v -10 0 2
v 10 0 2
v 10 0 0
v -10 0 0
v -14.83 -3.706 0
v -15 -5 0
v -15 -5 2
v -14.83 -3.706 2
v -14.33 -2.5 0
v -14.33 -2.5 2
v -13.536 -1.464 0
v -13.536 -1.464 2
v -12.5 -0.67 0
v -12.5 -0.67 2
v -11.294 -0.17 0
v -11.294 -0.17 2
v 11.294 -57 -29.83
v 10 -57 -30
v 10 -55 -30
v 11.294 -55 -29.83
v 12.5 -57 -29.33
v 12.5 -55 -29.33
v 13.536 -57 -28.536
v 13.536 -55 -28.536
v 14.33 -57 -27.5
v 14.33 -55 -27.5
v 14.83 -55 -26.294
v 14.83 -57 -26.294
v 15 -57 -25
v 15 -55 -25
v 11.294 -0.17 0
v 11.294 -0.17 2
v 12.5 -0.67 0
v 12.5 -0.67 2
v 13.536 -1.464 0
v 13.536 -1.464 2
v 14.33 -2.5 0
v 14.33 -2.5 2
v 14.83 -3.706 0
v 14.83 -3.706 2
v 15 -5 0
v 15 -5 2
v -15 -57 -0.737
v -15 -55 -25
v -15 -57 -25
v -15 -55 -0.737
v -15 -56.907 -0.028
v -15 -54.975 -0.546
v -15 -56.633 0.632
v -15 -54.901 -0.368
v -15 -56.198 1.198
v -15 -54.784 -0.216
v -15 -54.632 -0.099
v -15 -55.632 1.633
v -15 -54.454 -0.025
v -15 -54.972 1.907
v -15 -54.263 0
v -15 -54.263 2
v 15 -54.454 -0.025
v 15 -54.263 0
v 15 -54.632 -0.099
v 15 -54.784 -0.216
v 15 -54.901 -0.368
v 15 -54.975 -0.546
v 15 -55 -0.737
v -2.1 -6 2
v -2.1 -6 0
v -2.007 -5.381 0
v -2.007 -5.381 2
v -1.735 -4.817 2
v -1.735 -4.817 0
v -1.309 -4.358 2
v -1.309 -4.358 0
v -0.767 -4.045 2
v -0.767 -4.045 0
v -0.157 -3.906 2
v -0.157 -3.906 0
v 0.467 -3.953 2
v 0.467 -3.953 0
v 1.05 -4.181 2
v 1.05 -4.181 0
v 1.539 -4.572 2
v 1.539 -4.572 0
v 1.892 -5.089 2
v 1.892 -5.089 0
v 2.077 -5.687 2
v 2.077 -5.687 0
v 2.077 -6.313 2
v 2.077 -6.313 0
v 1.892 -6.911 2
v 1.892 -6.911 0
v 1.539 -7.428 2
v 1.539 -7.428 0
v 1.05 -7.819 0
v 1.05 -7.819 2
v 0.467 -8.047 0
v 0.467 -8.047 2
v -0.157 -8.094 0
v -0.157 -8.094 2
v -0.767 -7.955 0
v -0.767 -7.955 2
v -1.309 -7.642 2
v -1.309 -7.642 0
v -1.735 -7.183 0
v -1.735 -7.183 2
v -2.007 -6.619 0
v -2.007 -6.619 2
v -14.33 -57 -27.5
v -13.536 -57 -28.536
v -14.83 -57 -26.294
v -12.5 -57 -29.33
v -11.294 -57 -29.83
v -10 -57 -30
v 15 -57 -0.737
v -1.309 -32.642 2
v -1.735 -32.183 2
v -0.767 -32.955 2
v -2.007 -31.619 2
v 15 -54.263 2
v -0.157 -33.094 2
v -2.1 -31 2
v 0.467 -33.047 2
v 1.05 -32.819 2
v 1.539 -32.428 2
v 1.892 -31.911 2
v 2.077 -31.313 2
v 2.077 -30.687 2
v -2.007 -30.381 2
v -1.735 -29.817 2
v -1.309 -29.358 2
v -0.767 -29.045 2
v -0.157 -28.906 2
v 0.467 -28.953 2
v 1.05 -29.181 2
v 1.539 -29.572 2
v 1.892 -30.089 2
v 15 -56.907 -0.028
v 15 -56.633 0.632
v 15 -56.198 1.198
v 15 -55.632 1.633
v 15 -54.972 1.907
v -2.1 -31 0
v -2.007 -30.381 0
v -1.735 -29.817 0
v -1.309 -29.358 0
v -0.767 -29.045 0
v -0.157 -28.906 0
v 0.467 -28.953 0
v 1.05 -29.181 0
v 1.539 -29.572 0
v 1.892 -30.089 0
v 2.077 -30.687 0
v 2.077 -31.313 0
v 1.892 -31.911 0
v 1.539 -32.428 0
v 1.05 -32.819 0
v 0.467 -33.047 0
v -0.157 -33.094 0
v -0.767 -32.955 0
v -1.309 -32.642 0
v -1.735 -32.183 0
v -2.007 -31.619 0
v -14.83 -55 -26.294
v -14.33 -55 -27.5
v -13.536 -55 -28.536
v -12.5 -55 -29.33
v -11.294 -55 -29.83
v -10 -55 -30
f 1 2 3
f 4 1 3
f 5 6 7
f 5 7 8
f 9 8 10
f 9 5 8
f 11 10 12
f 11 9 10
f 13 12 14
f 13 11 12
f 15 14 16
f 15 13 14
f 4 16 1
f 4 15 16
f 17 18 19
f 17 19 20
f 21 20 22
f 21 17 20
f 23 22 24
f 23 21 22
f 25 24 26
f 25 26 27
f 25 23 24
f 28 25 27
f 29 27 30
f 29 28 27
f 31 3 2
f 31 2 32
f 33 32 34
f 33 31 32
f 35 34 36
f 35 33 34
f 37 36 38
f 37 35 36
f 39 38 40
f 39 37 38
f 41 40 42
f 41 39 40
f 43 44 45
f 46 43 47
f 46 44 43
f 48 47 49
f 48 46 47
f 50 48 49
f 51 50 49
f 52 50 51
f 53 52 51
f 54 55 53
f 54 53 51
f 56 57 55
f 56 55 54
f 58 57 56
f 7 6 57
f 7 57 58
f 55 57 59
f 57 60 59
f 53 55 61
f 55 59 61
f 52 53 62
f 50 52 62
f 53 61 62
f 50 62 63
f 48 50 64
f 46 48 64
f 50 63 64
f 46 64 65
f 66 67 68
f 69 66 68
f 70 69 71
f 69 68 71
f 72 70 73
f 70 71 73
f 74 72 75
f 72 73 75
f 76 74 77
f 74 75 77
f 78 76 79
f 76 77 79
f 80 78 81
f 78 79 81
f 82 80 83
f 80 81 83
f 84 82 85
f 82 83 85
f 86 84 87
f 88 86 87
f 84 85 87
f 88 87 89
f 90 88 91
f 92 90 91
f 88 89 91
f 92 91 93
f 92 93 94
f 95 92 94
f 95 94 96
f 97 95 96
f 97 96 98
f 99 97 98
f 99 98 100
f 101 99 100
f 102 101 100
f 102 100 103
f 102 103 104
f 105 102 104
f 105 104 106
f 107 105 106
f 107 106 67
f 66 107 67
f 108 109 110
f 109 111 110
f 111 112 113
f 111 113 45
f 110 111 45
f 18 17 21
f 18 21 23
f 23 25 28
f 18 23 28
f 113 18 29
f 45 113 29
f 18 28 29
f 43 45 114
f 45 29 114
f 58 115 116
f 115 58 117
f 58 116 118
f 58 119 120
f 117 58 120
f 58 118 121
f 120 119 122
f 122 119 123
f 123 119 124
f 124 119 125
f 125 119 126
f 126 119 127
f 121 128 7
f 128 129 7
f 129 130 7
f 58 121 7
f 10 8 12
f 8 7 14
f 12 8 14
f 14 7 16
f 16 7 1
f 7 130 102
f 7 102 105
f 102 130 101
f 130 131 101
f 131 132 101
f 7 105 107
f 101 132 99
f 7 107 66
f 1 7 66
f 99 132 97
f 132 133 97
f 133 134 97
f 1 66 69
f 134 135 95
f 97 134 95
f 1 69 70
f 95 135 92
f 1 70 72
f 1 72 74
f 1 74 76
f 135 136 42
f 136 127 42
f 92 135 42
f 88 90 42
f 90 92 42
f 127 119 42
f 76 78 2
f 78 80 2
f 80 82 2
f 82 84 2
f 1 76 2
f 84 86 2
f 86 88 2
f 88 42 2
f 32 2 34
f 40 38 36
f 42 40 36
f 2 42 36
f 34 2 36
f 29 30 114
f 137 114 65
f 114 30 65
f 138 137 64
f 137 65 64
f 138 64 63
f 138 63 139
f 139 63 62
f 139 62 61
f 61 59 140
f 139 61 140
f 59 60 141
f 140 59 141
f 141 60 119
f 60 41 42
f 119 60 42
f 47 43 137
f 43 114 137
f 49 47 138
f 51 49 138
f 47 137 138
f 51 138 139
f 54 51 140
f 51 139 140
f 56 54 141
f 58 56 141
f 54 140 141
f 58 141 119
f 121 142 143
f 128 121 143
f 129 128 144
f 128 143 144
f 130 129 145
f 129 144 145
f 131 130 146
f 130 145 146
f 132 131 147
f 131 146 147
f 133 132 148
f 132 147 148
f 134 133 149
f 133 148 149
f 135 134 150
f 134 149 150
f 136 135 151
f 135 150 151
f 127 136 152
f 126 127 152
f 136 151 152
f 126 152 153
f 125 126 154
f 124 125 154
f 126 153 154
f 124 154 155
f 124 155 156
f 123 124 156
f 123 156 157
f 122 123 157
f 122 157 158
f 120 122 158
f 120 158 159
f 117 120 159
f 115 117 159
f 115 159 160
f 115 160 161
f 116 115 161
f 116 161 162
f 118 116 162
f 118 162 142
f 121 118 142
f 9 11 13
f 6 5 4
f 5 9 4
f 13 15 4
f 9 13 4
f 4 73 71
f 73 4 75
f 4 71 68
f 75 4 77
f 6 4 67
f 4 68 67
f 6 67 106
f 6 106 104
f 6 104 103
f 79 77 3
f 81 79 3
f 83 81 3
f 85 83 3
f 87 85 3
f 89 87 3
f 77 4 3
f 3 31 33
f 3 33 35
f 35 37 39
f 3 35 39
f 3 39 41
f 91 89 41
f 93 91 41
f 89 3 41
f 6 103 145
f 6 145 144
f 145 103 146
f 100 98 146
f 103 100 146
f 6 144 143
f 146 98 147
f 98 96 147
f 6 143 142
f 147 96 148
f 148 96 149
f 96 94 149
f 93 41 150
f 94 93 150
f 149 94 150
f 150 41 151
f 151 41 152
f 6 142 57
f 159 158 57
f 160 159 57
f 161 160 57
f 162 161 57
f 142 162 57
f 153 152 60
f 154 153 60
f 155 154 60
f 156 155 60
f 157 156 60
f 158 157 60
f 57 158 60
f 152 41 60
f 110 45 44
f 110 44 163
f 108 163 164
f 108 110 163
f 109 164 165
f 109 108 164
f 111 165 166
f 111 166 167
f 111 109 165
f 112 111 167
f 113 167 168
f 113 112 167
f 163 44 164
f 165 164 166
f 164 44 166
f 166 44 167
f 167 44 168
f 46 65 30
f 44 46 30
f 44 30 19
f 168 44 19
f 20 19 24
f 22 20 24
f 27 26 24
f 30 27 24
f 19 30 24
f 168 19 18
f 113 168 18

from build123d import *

# Parameters (mm, degrees)
TABAN_FLAN_1_DEPTH   = 15
M5_DI_LI_DELIK1_D    = 4.2
K_ELERI_START        = -57
K_ELERI_K_R1_DEPTH   = 2
K_ELERI_K_R1_2_DEPTH = 2


# Read off the part's stored shape, not the designer's step: Köşeleri kır1
# Sheet-metal steps are written as plain solids
with BuildPart() as part:
    # Çizim1 → Taban-Flanş1 (new, symmetric)
    with BuildSketch(Plane(origin=(0, 0, 0), x_dir=(0, 0, -1), z_dir=(1, 0, 0))):
        with BuildLine():
            Line((0, 0), (0, -54.2634))
            ThreePointArc((0, -54.2634), (0.215745145, -54.784254855), (0.7366, -55))
            Line((0.7366, -55), (30, -55))
            Line((30, -55), (30, -57))
            Line((30, -57), (0.7366, -57))
            ThreePointArc((0.7366, -57), (-1.198468417, -56.198468417), (-2, -54.2634))
            Line((-2, -54.2634), (-2, 0))
            Line((-2, 0), (0, 0))
        make_face()
    extrude(amount=TABAN_FLAN_1_DEPTH, both=True)

    # M5 Dişli Delik1 (through all)
    with Locations(Plane(origin=(0, -31, 2), x_dir=(1, 0, 0), z_dir=(0, 0, 1))):
        with Locations((0, 0), (0, 25)):
            Hole(M5_DI_LI_DELIK1_D / 2)

    # Köşeleri kır1 outline → Köşeleri kır1 (cut)
    with BuildSketch(Plane(origin=(0, 0, 0), x_dir=(1, 0, 0), z_dir=(0, 1, 0)).offset(K_ELERI_START)):
        with BuildLine():
            Line((15, 30), (10, 30))
            ThreePointArc((10, 30), (13.535533906, 28.535533906), (15, 25))
            Line((15, 25), (15, 30))
        make_face()
        with BuildLine():
            ThreePointArc((-15, 25), (-13.535533906, 28.535533906), (-10, 30))
            Line((-10, 30), (-15, 30))
            Line((-15, 30), (-15, 25))
        make_face()
    extrude(amount=K_ELERI_K_R1_DEPTH, mode=Mode.SUBTRACT)

    # K_eleri k_r1 2 outline → K_eleri k_r1 2 (cut)
    with BuildSketch(Plane.XY):
        with BuildLine():
            Line((-15, 0), (-15, -5))
            ThreePointArc((-15, -5), (-13.535533906, -1.464466094), (-10, 0))
            Line((-10, 0), (-15, 0))
        make_face()
        with BuildLine():
            Line((15, 0), (10, 0))
            ThreePointArc((10, 0), (13.535533906, -1.464466094), (15, -5))
            Line((15, -5), (15, 0))
        make_face()
    extrude(amount=K_ELERI_K_R1_2_DEPTH, mode=Mode.SUBTRACT)


solid = part.part
